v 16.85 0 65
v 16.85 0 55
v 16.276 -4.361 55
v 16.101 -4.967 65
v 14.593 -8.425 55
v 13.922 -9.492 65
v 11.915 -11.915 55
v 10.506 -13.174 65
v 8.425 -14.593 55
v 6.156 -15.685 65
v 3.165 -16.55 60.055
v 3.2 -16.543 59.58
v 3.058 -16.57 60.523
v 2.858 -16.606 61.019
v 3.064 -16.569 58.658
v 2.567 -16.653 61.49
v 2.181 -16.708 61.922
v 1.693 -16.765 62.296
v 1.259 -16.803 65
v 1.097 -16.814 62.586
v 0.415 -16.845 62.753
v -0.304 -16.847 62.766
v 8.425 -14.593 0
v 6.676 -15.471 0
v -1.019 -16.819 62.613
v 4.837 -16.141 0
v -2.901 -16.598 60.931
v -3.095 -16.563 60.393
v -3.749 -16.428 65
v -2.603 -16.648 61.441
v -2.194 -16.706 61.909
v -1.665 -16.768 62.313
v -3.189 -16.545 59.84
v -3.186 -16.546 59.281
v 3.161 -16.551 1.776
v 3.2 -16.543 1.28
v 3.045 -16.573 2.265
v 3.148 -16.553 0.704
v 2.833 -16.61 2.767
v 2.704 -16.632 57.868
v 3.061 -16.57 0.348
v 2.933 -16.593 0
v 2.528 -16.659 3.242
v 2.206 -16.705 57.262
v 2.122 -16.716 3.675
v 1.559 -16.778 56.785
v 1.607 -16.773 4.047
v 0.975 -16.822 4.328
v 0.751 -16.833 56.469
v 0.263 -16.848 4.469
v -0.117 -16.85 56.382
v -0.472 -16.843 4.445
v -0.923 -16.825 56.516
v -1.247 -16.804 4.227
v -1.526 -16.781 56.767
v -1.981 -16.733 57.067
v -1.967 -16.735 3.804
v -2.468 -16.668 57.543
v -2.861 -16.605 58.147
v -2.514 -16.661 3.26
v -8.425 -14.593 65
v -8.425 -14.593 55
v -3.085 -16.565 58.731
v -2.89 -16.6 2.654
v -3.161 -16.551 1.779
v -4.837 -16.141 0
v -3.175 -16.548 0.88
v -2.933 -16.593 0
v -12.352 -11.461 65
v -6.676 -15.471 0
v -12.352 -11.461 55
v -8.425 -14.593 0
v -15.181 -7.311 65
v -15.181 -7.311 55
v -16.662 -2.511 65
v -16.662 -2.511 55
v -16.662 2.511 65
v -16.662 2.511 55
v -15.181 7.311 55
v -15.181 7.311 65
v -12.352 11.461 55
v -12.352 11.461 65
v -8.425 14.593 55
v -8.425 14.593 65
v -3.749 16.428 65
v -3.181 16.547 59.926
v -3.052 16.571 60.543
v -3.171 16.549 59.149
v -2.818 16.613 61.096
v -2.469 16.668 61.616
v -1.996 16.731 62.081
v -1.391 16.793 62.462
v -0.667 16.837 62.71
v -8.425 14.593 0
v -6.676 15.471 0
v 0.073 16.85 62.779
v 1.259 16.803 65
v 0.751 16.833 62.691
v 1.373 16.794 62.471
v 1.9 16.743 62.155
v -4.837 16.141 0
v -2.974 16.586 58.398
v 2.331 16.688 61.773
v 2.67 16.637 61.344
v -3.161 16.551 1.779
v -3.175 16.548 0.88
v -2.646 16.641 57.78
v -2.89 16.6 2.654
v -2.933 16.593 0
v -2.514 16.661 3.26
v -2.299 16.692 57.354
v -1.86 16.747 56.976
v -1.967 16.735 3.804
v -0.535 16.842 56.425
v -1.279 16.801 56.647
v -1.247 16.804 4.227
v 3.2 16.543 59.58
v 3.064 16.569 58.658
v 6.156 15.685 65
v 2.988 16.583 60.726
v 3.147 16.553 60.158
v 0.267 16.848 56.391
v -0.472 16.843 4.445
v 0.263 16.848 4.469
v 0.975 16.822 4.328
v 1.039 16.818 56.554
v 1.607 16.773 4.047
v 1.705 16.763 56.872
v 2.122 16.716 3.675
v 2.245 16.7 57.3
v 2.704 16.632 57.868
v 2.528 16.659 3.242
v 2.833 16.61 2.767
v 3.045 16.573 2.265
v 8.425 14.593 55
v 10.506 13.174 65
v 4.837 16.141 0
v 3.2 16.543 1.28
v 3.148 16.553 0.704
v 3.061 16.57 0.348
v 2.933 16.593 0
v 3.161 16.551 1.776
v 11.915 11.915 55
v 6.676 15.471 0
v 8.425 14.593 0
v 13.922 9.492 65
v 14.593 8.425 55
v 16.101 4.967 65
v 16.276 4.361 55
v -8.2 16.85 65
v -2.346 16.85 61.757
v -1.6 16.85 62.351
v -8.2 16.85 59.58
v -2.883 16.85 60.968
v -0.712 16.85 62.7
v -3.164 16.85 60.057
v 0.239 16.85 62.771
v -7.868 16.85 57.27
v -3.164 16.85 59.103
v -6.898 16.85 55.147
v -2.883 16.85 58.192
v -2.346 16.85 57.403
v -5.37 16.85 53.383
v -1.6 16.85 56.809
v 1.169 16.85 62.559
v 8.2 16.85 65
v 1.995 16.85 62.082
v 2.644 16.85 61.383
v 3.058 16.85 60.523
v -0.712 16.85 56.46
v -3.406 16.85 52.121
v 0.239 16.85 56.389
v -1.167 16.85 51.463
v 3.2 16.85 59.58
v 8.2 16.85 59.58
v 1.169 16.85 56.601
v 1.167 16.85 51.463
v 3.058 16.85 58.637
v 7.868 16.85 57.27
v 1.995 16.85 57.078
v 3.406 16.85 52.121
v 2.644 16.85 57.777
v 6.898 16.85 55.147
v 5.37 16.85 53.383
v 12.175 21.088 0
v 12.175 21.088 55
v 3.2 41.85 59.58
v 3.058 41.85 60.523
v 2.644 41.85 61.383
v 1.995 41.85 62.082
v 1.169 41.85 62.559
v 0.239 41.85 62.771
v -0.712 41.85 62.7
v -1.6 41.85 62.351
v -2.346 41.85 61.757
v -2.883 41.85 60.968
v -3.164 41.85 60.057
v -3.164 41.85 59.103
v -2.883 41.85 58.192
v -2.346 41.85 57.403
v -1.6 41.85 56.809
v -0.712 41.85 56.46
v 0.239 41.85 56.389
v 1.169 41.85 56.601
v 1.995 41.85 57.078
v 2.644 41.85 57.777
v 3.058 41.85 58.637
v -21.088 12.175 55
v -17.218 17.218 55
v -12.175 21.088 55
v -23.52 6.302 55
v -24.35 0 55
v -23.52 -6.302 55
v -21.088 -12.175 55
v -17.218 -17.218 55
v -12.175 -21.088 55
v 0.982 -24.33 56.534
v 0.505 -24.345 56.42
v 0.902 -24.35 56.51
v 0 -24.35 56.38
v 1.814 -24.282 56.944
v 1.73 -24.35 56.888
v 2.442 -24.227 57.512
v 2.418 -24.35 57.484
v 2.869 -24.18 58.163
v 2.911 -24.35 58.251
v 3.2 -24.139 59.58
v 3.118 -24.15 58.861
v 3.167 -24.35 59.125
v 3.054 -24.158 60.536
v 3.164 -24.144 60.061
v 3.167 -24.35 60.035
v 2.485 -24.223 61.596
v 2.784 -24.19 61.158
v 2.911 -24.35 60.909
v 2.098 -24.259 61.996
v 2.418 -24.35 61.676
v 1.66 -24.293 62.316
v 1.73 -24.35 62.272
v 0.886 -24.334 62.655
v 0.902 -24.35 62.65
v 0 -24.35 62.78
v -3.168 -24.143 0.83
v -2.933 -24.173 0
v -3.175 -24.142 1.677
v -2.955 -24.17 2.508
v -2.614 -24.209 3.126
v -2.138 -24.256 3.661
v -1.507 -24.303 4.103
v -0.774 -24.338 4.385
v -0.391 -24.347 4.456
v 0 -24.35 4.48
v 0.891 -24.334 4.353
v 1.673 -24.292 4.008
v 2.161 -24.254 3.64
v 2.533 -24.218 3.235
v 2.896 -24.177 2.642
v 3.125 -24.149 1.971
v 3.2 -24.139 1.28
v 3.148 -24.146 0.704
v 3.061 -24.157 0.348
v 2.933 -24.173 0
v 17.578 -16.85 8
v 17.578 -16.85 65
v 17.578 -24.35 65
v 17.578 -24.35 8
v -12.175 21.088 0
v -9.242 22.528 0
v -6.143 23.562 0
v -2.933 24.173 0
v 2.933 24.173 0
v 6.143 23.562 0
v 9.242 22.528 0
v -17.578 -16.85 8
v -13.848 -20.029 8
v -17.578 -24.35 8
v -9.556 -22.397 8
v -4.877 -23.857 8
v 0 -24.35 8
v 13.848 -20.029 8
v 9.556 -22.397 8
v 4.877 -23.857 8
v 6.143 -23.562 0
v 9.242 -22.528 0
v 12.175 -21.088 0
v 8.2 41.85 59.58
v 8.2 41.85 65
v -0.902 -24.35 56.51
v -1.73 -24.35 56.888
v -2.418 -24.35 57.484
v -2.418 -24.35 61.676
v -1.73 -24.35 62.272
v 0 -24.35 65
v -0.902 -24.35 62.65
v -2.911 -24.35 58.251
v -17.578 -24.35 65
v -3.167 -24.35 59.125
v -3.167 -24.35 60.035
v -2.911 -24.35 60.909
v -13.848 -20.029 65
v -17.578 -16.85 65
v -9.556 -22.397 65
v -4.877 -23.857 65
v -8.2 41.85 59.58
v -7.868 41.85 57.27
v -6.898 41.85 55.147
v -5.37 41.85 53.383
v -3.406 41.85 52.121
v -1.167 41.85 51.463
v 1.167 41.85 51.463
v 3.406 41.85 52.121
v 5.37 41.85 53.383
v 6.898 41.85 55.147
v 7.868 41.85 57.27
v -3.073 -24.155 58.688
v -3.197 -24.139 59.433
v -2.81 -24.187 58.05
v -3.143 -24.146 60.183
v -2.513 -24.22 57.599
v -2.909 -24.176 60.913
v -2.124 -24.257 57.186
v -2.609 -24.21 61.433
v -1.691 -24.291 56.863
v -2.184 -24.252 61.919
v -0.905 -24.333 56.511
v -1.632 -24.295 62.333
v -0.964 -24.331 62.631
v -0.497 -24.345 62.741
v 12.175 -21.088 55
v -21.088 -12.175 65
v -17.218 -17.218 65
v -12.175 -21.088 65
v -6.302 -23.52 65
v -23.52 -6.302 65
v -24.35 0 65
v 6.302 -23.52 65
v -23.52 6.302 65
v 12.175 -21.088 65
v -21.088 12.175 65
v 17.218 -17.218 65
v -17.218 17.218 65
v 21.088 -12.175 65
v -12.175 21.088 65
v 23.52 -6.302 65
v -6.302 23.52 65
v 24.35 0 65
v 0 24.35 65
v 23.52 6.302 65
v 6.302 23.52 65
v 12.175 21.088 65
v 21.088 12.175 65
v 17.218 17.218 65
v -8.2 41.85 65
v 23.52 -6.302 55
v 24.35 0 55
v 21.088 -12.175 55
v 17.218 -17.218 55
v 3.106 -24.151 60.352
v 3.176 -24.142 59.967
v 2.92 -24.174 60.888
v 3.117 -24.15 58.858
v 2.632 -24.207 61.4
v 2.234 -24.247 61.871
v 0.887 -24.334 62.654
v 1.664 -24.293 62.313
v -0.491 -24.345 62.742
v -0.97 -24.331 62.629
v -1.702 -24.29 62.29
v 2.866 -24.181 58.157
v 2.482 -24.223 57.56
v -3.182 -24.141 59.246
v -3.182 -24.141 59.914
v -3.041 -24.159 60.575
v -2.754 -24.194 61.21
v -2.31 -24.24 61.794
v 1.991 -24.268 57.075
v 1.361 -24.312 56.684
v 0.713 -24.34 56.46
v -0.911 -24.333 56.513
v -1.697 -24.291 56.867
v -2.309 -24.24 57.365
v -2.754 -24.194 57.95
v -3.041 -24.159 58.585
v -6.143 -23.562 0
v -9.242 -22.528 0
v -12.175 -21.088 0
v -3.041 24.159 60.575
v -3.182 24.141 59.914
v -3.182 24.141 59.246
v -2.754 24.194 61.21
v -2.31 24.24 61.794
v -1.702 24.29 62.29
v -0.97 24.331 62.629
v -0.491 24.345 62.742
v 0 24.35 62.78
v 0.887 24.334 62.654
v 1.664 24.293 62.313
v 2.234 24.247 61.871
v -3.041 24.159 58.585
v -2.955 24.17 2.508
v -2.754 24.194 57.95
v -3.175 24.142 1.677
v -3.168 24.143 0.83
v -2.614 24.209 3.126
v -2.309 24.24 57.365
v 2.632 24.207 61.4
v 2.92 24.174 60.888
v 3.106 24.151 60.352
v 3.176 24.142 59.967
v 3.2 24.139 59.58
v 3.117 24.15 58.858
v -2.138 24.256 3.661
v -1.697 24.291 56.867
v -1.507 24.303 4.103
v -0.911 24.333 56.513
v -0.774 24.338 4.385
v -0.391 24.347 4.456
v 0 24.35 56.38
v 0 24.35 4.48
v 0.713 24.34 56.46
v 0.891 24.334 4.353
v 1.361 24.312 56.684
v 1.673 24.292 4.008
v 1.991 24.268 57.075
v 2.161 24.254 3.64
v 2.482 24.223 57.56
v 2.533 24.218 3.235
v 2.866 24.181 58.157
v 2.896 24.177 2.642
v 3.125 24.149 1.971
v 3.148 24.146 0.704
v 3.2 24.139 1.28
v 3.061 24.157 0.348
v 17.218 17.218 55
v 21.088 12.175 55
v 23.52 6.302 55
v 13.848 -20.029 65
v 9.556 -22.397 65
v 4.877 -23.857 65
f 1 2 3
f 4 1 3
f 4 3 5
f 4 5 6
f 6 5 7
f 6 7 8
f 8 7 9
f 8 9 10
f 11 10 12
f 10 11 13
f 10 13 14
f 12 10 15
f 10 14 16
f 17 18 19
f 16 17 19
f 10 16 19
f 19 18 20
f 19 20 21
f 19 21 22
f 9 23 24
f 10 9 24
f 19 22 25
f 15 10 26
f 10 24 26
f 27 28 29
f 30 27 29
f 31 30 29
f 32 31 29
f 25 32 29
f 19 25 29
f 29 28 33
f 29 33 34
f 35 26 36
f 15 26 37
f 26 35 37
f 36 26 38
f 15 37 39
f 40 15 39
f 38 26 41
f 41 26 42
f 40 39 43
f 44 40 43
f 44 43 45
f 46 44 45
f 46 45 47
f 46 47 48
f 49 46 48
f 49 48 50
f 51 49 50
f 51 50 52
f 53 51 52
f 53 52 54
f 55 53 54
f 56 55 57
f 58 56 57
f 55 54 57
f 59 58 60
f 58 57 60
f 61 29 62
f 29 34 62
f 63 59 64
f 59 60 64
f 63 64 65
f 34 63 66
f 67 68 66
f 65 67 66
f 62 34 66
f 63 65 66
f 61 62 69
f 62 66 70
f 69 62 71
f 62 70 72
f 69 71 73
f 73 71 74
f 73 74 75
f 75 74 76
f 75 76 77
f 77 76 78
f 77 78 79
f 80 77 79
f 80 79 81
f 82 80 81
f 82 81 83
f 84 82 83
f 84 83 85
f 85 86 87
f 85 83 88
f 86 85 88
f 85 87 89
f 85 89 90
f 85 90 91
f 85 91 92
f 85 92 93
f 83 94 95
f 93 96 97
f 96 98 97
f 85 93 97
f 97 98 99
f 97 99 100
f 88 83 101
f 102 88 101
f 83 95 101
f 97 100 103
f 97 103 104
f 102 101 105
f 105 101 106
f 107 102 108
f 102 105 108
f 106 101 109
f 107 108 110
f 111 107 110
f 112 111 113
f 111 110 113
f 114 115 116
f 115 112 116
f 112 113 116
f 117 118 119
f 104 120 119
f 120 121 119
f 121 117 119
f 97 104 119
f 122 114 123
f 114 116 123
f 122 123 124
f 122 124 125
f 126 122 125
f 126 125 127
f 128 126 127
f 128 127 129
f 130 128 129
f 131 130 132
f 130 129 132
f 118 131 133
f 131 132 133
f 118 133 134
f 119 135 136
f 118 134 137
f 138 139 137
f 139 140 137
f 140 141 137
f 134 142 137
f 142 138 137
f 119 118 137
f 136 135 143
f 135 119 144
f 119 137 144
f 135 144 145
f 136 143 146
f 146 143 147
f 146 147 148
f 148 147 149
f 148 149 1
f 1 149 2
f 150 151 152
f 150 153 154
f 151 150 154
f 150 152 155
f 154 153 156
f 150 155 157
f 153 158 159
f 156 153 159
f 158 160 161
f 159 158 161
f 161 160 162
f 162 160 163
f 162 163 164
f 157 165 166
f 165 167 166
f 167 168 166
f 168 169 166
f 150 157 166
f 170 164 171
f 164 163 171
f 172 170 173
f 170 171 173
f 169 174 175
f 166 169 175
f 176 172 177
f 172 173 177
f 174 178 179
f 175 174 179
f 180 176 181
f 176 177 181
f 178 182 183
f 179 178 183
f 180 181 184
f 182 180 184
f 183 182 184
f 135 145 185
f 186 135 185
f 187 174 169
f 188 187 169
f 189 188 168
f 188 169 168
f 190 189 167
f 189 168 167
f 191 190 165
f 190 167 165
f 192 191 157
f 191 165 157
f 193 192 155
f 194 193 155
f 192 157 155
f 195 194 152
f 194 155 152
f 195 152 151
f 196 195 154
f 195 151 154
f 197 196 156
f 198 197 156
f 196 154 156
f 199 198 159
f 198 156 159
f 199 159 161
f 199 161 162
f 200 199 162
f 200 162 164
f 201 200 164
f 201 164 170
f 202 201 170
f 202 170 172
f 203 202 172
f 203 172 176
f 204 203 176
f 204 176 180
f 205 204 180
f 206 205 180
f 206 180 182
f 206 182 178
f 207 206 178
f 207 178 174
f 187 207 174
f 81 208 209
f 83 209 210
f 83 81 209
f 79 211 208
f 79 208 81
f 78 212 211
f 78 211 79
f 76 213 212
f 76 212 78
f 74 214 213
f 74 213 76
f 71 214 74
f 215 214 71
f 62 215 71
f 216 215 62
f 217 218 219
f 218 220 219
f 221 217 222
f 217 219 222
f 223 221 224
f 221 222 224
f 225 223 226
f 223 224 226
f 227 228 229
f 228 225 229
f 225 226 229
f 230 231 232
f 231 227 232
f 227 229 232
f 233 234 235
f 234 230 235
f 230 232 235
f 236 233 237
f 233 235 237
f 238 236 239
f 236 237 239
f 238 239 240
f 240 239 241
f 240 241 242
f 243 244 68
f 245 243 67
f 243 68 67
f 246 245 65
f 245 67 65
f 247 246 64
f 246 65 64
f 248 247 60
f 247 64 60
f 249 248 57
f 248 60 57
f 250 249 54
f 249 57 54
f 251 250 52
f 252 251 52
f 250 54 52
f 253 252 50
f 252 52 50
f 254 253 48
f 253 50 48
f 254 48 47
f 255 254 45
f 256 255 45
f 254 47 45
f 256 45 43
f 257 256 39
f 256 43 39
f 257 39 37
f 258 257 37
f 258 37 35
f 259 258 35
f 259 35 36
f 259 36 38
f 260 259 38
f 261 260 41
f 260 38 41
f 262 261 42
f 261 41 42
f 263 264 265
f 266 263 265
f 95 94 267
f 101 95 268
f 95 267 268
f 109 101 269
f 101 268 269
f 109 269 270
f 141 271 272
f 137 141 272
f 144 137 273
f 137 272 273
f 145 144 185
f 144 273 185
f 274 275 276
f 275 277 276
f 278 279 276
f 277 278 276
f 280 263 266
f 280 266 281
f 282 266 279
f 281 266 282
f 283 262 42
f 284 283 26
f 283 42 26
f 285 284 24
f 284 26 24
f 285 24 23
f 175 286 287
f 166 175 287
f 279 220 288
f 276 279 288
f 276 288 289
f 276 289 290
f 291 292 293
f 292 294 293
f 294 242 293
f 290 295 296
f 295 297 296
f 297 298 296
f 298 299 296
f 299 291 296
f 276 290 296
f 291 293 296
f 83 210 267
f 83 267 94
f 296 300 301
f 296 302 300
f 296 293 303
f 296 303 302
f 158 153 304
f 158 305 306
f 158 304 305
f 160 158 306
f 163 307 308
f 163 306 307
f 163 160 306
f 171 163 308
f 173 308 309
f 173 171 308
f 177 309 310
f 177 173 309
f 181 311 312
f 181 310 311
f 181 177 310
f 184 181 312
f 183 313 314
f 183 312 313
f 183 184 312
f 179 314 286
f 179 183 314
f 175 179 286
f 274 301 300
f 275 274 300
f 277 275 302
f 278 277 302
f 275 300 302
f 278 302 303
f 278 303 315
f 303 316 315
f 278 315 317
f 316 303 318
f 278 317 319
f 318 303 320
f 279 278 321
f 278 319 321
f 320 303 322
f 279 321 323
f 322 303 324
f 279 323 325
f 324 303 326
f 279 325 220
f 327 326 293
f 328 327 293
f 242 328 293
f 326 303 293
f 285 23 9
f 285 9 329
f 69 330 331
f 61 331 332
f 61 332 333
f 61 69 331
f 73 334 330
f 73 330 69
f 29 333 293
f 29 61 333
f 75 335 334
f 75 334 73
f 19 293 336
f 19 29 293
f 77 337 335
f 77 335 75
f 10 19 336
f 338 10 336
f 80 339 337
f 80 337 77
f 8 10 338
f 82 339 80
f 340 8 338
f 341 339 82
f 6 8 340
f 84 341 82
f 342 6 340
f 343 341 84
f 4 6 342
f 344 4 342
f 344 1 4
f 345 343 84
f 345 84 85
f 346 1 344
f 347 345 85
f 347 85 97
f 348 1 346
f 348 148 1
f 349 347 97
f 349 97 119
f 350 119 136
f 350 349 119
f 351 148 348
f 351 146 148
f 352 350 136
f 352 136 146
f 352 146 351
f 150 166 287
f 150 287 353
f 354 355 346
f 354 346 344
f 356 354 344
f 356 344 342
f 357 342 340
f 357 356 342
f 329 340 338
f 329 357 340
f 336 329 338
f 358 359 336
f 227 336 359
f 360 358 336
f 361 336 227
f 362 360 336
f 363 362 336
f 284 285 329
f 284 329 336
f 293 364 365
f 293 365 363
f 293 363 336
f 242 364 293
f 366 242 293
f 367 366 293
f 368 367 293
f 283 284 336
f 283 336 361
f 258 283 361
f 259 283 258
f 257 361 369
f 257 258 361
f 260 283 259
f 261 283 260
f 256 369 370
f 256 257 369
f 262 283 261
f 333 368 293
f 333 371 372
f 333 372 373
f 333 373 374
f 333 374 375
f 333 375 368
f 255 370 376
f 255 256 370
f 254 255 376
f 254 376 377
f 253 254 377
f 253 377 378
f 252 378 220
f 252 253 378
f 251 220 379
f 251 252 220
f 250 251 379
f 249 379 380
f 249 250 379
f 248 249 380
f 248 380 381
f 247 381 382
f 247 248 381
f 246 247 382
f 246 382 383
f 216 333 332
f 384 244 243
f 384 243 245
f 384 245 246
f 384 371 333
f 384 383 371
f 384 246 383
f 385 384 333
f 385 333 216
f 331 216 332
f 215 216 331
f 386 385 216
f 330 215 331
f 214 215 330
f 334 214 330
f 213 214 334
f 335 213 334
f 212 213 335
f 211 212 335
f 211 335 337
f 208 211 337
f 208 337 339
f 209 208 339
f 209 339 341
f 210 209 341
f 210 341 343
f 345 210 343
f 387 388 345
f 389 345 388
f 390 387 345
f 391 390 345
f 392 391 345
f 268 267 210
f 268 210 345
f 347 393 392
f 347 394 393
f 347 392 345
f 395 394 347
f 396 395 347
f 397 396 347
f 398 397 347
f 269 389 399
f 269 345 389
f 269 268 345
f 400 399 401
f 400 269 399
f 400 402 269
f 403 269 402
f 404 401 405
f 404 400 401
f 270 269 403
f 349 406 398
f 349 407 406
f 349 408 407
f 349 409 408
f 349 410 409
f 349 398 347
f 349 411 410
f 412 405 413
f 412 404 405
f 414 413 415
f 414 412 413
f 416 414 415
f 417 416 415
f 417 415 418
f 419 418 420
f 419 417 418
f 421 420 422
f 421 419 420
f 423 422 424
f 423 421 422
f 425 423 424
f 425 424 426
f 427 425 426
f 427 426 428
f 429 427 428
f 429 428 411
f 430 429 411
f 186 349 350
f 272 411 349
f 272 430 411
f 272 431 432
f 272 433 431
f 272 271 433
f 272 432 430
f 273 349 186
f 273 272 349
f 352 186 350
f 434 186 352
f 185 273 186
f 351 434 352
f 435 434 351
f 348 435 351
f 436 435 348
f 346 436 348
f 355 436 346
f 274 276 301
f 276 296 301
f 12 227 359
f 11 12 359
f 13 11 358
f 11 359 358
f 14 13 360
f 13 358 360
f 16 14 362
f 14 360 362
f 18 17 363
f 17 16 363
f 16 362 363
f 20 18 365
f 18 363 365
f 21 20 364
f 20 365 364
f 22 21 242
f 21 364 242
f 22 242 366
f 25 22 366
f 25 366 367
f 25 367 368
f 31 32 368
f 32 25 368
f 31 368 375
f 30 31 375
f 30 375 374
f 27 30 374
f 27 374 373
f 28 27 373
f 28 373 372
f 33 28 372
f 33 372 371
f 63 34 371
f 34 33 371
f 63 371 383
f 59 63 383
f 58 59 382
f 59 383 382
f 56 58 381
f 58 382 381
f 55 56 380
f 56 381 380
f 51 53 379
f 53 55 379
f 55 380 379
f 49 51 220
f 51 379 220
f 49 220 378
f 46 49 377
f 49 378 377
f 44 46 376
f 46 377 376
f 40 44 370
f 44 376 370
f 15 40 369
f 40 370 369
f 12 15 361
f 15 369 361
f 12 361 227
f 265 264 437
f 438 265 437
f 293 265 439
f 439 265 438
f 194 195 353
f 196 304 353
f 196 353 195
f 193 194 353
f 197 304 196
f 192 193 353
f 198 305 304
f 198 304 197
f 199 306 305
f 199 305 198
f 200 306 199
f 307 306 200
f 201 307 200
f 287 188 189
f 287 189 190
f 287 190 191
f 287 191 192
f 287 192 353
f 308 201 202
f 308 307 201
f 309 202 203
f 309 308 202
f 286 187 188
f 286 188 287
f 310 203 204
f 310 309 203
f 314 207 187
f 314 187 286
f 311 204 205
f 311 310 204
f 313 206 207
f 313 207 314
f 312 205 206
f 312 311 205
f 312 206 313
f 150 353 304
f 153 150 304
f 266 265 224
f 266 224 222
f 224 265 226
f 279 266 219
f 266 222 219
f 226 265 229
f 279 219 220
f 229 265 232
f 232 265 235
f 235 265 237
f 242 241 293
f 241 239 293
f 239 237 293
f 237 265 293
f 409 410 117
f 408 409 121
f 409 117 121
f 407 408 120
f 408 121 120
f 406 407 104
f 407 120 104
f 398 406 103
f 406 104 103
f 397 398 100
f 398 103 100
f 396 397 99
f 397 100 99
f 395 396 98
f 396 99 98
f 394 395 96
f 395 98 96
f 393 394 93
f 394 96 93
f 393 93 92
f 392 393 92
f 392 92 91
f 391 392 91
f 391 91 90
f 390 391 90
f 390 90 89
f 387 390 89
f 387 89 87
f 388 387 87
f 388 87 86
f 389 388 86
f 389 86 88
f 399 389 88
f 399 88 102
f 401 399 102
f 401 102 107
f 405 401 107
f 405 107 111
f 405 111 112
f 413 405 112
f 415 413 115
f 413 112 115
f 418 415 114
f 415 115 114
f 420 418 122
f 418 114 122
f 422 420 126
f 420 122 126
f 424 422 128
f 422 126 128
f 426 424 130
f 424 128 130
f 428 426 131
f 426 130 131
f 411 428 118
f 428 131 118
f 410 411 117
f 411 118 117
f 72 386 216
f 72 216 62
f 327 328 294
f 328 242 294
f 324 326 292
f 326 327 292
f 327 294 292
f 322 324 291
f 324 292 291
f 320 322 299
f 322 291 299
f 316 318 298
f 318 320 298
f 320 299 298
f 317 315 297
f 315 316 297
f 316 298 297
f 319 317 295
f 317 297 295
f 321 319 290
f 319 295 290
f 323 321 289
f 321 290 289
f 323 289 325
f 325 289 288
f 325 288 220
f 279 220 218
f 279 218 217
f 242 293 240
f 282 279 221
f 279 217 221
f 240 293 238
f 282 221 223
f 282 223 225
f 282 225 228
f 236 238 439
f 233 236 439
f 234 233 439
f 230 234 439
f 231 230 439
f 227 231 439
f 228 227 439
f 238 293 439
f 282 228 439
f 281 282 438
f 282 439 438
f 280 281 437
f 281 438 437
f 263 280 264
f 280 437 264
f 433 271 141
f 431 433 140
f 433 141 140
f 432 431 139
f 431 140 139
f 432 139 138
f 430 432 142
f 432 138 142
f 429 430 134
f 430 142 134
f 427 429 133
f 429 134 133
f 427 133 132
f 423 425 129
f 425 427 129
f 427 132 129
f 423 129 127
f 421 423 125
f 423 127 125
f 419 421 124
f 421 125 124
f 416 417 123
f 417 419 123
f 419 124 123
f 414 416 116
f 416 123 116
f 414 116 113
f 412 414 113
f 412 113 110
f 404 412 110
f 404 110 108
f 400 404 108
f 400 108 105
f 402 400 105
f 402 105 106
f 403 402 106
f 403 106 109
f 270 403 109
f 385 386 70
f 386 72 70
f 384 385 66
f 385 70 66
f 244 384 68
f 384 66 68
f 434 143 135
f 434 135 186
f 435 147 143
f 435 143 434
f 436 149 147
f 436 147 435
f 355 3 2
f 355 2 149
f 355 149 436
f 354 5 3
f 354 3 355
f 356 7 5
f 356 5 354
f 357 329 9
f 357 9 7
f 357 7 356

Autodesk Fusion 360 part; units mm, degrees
sketch "Main Body" plane through (0, 0, 0) normal (0, 0, 1) x (1, 0, 0)
  circle A0 centre (0, 0) radius 16.85
  circle A1 centre (0, 0) radius 24.35
  dimension "d1" = 33.7
  dimension "d2" = 48.7
extrude "Extrude1" add sketch "Main Body" along normal blind 65 makes body 1
sketch "Cut Guide" plane through (0, 0, 0) normal (0, 1, 0) x (1, 0, 0)
  circle A0 centre (0, -1.28) radius 3.2
  circle A1 centre (0, -59.58) radius 3.2
  circle A2 centre (0, -59.58) radius 8.2
  line L0 (-8.2, -59.58) -> (8.2, -59.58)
  line L1 (8.2, -59.58) -> (8.2, -65)
  line L2 (8.2, -65) -> (-8.2, -65)
  line L3 (-8.2, -65) -> (-8.2, -59.58)
  point P0 (0, -41.6319)
  dimension "d5" = 6.4
  dimension "d6" = 1.28
  dimension "d11" = 6.4
  dimension "d12" = 58.3
  dimension "d13" = 16.4
  dimension "d33" = 5.42
extrude "Extrude2" cut sketch "Cut Guide" along normal blind 24.35 and the other way blind 24.35 contours A0 bodies 1
extrude "Extrude3" add sketch "Cut Guide" along normal blind 25 from surface at 16.85 separate body contours A1 A2 L0 L2 | A1 A2 L0 | A2 L1 L2 | A2 L2 L3 makes body 2
sketch "Side Removal" plane through (0, 0, 0) normal (0, 0, -1) x (1, 0, 0)
  line L0 (-2.9328, 16.5928) -> (-2.9328, 24.1727)
  arc A0 (-2.9328, 24.1727) -> (-2.9328, -24.1727) centre (0, 0) ccw
  line L1 (-2.9328, -24.1727) -> (-2.9328, -16.5928)
  arc A1 (-2.9328, 16.5928) -> (-2.9328, -16.5928) centre (0, 0) ccw
  line L2 (-12.175, -21.0877) -> (12.175, 21.0877)
  arc A2 (2.9328, -24.1727) -> (2.9328, 24.1727) centre (0, 0) ccw
  line L3 (-12.175, 21.0877) -> (12.175, -21.0877)
  dimension "d19" = 120
extrude "Extrude4" cut sketch "Side Removal" against normal blind 55 contours L2 A2 L3 | A1 L2 L3 | A0 A1 L2 L3 bodies 1
sketch "Flat Bottom" plane through (0, 0, 65) normal (0, 0, 1) x (-1, 0, 0)
  circle A0 centre (0, 0) radius 16.85
  circle A1 centre (0, 0) radius 24.35
  line L0 (17.5784, 16.85) -> (-17.5784, 16.85)
  line L1 (-17.5784, 16.85) -> (-17.5784, 24.35)
  line L2 (-17.5784, 24.35) -> (17.5784, 24.35)
  line L3 (17.5784, 24.35) -> (17.5784, 16.85)
extrude "Extrude6" add sketch "Flat Bottom" against normal blind 57 separate body contours A1 L2 L3 | A1 L1 L2 makes body 3 at (-14.2929, -19.7139, 27)
extrude "Extrude7" cut sketch "Cut Guide" along normal blind 24.35 and the other way blind 24.35 contours A1 L0 | A1 L0 bodies 1 3
equation "d2 = d1 + 15 mm"
equation "d3 = 65 mm"
equation "d6 = d5 / 5"
equation "d7 = d2 / 2"
equation "d9 = d2 / 2"
equation "d13 = d11 + 10 mm"
equation "d16 = ( d1 ) / 2"
equation "d21 = -( d3 - 10 mm )"
equation "d27 = -d3 + 8 mm"
equation "d29 = d2 / 2"
equation "d31 = d2 / 2"
equation "d33 = d3 - d12 - d6"
